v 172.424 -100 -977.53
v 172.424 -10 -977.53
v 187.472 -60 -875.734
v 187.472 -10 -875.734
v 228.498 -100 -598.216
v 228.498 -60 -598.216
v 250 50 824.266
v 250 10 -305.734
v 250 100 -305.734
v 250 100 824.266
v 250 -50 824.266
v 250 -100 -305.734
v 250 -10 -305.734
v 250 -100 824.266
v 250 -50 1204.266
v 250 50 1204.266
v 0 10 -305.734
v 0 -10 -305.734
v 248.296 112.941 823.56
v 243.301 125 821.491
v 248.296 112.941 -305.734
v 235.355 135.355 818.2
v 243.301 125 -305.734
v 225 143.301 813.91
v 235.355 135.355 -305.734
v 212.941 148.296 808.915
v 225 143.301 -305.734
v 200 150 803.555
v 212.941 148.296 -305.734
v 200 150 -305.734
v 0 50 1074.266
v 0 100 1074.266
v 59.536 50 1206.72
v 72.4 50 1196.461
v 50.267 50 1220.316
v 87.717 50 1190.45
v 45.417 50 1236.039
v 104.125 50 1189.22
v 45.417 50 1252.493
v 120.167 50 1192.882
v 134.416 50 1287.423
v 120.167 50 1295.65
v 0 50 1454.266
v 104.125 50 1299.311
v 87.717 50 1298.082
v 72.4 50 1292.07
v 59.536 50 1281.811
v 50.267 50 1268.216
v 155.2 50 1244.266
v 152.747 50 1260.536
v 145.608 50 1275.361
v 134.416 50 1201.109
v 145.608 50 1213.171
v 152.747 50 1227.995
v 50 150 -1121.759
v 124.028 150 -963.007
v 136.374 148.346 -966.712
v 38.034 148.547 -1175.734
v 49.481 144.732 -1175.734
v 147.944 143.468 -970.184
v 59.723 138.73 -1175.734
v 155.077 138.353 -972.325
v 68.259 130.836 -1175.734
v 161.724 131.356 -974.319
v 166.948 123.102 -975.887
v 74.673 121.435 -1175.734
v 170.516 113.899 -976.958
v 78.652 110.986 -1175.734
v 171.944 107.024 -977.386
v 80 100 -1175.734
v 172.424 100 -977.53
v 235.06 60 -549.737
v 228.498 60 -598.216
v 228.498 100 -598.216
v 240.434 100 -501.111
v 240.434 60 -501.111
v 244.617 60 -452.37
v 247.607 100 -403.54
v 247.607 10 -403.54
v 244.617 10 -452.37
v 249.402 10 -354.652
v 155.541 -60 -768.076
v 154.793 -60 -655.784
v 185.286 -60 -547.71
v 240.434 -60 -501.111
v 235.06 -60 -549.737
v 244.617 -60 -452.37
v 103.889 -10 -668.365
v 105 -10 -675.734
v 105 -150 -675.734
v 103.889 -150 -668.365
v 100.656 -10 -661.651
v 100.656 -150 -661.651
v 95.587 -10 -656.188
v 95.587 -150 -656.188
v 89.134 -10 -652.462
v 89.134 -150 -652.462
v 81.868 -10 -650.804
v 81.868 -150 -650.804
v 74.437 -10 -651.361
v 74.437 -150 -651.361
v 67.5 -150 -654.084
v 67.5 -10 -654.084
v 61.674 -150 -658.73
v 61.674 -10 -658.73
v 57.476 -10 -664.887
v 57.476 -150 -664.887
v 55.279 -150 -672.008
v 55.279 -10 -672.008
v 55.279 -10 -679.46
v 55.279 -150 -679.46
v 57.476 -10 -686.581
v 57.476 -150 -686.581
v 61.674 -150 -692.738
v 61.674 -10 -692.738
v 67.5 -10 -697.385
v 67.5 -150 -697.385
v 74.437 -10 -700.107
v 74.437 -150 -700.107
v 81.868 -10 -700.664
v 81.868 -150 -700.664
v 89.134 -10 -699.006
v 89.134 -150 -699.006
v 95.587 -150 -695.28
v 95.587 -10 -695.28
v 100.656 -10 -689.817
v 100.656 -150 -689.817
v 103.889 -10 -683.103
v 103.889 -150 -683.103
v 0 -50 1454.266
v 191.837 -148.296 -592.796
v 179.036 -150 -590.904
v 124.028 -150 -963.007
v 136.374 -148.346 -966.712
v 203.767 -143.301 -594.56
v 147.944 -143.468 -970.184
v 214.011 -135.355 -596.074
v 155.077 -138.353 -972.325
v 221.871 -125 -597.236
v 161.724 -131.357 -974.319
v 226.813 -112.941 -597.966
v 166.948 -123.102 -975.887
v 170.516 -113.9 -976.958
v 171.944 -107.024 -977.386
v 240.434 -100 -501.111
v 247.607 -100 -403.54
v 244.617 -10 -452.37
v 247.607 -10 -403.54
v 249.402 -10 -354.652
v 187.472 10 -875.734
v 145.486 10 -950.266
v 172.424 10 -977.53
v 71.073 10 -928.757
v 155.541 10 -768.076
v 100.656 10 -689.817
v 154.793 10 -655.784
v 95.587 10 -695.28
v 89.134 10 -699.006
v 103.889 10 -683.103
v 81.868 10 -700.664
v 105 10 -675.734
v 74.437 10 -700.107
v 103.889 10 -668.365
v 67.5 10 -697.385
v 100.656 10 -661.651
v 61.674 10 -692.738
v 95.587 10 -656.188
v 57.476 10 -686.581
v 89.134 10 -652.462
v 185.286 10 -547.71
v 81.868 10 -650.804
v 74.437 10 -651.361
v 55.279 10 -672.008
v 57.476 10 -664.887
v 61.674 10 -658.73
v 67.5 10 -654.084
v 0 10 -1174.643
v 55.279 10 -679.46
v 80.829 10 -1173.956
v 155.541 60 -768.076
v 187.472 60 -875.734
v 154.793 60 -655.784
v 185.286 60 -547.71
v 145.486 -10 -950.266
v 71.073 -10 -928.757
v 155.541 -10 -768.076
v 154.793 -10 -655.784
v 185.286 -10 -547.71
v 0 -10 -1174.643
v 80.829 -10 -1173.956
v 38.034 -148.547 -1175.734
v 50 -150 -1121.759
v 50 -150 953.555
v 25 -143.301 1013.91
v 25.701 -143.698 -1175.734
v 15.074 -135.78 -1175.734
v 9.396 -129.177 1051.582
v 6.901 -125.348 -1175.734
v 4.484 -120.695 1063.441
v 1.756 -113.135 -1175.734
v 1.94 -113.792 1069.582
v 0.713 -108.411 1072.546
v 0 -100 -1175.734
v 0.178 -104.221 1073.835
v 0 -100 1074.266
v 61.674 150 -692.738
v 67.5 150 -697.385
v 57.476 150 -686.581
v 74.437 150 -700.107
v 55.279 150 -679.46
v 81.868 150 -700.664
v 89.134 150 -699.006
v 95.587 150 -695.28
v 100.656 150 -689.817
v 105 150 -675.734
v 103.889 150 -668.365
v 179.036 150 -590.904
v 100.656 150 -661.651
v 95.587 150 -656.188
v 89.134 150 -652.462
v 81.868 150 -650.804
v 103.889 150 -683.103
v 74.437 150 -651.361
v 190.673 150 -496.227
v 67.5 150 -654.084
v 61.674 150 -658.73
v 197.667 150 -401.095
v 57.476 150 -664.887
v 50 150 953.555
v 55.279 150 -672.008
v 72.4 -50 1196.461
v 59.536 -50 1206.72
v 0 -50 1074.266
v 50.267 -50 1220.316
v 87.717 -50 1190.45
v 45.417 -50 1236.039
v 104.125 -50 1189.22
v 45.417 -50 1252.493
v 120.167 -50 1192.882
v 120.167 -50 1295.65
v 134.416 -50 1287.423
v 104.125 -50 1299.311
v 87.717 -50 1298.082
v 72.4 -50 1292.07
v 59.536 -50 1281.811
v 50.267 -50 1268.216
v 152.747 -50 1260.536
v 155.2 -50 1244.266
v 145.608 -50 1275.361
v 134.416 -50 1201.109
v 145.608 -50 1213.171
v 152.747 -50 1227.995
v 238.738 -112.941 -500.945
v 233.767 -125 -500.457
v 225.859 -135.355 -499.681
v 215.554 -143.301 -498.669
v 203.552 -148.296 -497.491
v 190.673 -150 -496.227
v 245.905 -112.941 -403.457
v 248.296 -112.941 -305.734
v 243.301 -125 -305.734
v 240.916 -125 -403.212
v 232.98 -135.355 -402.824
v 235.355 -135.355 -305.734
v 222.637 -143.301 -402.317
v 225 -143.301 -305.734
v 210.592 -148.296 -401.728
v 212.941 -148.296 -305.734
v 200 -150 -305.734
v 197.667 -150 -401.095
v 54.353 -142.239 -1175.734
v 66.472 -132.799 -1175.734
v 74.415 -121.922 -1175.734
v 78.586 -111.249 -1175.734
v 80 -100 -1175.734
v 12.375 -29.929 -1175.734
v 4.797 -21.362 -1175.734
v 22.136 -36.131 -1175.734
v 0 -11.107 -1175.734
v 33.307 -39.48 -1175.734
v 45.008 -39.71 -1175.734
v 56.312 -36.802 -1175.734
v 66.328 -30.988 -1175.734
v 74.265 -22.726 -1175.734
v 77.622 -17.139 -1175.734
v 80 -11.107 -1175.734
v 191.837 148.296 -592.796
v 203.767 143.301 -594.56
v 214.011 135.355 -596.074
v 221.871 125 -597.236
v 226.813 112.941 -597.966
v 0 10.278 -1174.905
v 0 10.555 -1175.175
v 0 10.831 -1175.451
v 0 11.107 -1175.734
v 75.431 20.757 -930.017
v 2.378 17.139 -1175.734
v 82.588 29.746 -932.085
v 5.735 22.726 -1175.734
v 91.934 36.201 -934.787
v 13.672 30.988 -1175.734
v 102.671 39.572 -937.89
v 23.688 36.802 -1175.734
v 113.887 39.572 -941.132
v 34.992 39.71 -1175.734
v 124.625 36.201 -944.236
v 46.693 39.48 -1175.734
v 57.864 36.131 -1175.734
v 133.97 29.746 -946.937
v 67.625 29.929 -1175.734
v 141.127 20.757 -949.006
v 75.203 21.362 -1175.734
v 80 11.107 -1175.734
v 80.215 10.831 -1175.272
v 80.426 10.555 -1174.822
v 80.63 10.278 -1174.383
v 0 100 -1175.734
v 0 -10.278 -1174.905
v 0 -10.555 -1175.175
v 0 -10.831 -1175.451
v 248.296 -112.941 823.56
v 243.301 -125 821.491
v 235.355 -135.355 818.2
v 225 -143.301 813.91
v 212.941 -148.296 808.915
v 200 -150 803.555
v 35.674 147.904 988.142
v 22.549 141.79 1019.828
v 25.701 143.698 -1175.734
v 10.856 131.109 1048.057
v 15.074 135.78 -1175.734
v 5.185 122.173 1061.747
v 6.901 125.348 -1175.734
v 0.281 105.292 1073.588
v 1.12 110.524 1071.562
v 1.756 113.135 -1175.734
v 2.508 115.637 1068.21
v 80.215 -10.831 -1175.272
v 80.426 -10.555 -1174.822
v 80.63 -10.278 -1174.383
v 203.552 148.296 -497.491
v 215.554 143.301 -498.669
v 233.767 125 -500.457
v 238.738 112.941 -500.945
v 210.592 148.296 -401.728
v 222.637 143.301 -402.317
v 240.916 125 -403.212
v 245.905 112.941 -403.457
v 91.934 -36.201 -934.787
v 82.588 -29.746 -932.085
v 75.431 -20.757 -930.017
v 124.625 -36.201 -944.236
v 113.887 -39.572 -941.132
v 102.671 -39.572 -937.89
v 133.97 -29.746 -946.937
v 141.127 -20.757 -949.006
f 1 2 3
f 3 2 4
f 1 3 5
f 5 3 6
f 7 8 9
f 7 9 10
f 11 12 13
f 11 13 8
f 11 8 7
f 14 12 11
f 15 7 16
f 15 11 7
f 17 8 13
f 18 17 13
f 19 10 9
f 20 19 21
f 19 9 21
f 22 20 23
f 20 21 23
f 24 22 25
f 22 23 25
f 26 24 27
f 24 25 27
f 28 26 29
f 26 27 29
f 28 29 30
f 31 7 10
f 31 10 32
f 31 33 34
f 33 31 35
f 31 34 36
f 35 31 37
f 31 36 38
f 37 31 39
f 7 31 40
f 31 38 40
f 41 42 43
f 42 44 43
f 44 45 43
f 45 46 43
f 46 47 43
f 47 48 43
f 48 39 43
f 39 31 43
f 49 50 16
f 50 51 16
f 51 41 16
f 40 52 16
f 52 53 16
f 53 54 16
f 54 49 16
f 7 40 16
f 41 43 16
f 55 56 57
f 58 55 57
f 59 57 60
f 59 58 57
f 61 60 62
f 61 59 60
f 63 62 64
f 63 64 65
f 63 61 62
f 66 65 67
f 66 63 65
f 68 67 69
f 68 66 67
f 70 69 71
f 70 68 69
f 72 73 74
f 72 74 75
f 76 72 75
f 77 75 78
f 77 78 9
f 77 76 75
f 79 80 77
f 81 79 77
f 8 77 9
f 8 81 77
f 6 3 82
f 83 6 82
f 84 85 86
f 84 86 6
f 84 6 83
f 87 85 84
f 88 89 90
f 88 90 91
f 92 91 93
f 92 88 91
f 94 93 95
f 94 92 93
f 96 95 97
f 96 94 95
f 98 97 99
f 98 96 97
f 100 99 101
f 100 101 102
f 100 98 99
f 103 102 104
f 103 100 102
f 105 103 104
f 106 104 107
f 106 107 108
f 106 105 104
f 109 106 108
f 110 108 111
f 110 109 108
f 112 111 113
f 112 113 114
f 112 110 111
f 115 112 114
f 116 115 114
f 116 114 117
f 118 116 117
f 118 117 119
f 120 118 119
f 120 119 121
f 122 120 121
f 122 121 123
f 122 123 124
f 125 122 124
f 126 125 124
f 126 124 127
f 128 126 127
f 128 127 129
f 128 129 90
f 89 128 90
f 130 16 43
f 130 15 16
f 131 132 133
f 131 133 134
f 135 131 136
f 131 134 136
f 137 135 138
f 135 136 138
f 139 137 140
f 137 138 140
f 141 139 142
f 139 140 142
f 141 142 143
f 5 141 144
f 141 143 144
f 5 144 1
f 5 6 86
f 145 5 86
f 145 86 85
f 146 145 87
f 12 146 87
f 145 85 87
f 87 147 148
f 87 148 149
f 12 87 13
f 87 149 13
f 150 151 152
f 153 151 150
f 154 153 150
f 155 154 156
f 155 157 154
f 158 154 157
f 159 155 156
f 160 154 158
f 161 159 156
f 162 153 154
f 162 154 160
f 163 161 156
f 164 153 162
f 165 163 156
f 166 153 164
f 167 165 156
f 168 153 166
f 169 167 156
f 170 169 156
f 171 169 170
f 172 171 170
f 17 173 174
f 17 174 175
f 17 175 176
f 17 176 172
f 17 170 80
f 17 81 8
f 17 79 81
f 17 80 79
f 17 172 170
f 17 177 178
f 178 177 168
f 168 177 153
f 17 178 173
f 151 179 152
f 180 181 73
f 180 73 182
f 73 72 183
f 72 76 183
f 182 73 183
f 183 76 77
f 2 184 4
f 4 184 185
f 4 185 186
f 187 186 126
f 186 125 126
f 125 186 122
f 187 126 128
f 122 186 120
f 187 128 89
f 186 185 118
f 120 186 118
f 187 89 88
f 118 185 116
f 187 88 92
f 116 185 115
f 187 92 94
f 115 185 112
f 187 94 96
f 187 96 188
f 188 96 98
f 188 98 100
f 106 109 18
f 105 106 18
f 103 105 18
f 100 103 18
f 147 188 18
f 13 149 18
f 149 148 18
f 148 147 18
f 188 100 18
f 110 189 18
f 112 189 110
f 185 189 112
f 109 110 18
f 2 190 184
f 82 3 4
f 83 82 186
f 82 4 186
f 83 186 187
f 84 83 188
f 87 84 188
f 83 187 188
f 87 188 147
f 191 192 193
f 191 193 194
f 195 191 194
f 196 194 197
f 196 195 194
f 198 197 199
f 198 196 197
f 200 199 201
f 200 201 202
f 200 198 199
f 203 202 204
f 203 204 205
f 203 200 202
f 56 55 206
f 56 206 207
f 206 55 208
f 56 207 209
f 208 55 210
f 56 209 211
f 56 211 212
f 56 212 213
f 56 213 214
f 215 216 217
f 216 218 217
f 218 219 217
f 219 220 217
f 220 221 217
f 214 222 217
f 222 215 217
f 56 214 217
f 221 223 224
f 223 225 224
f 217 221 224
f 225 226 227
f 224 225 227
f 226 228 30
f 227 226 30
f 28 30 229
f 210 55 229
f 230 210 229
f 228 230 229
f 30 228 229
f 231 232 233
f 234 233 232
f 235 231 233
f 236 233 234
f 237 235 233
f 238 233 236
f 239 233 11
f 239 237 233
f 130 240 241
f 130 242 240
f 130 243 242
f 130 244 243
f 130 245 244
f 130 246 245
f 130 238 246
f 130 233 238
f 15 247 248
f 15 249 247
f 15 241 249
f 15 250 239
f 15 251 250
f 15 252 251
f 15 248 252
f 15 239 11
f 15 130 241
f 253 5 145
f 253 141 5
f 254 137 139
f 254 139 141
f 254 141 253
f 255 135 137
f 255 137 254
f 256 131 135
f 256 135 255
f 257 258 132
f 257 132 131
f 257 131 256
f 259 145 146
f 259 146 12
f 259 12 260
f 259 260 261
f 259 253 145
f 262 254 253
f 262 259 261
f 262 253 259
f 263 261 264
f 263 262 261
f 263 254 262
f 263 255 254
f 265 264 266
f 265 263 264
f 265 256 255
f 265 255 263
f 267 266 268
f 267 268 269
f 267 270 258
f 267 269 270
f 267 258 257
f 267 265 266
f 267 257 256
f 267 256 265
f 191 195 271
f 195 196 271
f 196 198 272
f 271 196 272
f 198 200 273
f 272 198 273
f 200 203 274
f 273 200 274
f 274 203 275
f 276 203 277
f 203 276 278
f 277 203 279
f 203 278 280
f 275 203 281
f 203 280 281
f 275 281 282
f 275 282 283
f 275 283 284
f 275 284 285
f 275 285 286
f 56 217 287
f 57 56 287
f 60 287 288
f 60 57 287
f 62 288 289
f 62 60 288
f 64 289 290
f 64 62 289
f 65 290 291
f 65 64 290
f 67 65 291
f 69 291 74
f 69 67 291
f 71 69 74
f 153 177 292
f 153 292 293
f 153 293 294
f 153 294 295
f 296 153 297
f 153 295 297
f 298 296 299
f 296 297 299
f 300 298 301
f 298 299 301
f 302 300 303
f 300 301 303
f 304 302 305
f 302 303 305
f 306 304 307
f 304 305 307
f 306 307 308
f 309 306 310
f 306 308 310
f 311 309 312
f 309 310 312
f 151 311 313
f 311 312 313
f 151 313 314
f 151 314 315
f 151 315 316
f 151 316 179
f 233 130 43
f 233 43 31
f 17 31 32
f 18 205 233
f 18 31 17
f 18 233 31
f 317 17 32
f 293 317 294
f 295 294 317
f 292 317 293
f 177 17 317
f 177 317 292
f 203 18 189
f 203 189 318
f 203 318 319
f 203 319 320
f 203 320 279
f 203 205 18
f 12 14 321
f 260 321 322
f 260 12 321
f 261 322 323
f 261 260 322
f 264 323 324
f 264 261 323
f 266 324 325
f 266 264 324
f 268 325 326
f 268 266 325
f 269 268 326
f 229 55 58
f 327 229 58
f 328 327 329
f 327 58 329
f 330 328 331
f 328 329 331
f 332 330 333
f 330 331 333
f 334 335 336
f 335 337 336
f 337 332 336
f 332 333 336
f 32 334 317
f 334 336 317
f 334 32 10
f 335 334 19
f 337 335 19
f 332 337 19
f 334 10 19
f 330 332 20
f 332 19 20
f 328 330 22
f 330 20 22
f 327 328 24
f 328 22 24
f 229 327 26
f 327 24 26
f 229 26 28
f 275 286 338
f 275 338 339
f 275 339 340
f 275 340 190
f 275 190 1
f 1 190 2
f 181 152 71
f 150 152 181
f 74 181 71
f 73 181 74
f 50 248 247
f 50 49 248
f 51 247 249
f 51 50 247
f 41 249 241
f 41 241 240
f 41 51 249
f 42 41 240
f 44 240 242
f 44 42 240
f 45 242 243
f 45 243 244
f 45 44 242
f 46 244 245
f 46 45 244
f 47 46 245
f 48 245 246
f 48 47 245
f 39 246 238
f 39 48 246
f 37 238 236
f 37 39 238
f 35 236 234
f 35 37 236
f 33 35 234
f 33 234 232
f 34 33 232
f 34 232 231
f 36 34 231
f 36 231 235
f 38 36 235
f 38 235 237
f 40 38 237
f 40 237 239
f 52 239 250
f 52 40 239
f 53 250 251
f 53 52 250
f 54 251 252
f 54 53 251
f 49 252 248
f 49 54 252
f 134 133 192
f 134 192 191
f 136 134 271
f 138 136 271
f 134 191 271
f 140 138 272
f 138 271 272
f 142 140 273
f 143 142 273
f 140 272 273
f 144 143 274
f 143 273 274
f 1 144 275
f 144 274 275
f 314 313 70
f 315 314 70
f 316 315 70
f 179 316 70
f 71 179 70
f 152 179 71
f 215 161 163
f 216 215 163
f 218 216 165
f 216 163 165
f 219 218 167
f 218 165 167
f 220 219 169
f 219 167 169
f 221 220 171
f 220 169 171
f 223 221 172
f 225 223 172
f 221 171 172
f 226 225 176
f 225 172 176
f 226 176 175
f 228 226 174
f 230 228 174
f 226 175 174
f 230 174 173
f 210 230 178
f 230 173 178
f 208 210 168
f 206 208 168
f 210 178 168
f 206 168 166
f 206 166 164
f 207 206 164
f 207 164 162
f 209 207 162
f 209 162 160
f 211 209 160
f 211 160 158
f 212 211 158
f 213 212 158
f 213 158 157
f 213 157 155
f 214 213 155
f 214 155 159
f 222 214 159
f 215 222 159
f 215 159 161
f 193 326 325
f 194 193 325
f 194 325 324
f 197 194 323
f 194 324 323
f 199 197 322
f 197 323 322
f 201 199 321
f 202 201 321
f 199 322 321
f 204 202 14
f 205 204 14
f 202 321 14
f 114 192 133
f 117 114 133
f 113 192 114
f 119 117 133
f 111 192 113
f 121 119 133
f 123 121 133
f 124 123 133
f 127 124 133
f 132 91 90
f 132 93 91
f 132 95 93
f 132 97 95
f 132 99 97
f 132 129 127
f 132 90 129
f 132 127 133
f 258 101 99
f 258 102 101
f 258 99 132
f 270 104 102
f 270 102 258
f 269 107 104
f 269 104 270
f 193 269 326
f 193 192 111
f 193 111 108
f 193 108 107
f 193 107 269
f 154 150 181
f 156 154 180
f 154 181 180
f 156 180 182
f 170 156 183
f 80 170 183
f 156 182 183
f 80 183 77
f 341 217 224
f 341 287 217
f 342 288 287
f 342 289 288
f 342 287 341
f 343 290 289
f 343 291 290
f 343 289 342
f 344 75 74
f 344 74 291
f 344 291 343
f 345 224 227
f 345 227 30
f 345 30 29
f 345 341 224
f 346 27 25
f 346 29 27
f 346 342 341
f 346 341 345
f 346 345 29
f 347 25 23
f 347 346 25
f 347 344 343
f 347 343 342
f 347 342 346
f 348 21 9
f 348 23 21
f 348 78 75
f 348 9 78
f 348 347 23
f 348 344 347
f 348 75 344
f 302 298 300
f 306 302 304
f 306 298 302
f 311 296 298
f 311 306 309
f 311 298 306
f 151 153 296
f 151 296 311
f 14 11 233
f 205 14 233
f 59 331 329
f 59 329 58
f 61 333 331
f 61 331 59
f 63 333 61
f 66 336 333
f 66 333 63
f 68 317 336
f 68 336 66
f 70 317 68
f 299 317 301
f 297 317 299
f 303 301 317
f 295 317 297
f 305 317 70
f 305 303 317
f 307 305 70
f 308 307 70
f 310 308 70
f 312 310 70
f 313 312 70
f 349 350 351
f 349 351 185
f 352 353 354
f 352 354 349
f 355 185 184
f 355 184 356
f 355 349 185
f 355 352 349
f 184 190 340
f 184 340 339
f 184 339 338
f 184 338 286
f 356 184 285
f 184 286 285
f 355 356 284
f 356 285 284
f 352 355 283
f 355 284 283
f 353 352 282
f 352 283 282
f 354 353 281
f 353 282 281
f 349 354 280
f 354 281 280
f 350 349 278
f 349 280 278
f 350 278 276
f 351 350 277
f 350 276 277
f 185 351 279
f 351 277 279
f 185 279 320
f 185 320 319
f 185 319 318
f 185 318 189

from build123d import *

# Parameters (mm, degrees)
F0_R          = 25
F1_DEPTH      = 150
F0_R_2        = 55.1997583715
F2_DEPTH      = 50
F4_DEPTH      = 250.001
F8_DEPTH      = 60
F10_R         = 40
F11_DEPTH     = 257
F12_T1_DEPTH  = 1255
F12_T3_DEPTH  = 2500
F12_T5_DEPTH  = 603.5533905933
F12_T7_DEPTH  = 556.1937137964
F12_T9_DEPTH  = 595.9370668734
F12_T14_DEPTH = 330
F12_S15_R     = 50
F12_T16_DEPTH = 170
F12_T20_DEPTH = 330
F12_S21_R     = 50
F12_T22_DEPTH = 170
F12_T26_DEPTH = 330
F12_S27_R     = 50
F12_T28_DEPTH = 170
F12_T32_DEPTH = 330
F12_S33_R     = 50
F12_T34_DEPTH = 170
F12_T36_ANGLE = 8.4091330213
F12_T38_ANGLE = 8.4091330213


# Not quite as in the source:
# - a fillet or chamfer that OpenCascade refuses, or shapes differently, is made with other operations: its cross-section is extruded or revolved along the edge and cut away or added


with BuildPart() as f1:
    # F0 (on Front) → F1 (new body)
    with BuildSketch(Plane.XZ):
        with BuildLine():
            Line((250, 824.2658257814), (0, 1074.2658257814))
            Line((0, 1074.2658257814), (0, -1175.7341742186))
            Line((0, -1175.7341742186), (80, -1175.7341742186))
            Line((80, -1175.7341742186), (172.4239571783, -977.530358429))
            Line((172.4239571783, -977.530358429), (228.4980691431, -598.2156102055))
            ThreePointArc((228.4980691431, -598.2156102055), (244.6172738506, -452.3695412242), (250, -305.7341742186))
            Line((250, -305.7341742186), (250, 824.2658257814))
        make_face()
        with Locations((80, -675.7341742186)):
            Circle(F0_R, mode=Mode.SUBTRACT)
    extrude(amount=F1_DEPTH)

    # F0 (on Front) → F2 (join)
    with BuildSketch(Plane.XZ):
        Polygon((0, 1454.2658257814), (0, 1074.2658257814), (250, 824.2658257814), (250, 1204.2658257814), align=None)
        with Locations((100, 1244.2658257814)):
            Circle(F0_R_2, mode=Mode.SUBTRACT)
    extrude(amount=F2_DEPTH)

    # F3 (on face) → F4 (cut, through all)
    with BuildSketch(Plane(origin=(0, 0, 0), x_dir=(0, -1, 0), z_dir=(-1, 0, 0))):
        Polygon((10, -1175.7341742186), (10, -305.7341742186), (0, -305.7341742186), (0, -598.2156102055), (0, -977.530358429), (0, -1175.7341742186), align=None)
    extrude(amount=-F4_DEPTH, mode=Mode.SUBTRACT)

    # F5: F1 across plane


with BuildPart() as f1_1:
    add(f1.part)
    add(f1.part.mirror(Plane.XZ))

    # F7 (on offset) → F8 (cut, symmetric)
    with BuildSketch(Plane(origin=(0, 0, 0), x_dir=(-1, 0, 0), z_dir=(0, 1, 0))):
        with BuildLine():
            Line((-228.4980691431, -598.2156102055), (-187.4724905077, -875.7341742186))
            ThreePointArc((-187.4724905077, -875.7341742186), (-154.7929091893, -655.7842074431), (-244.6172738506, -452.3695412242))
            Line((-244.6172738506, -452.3695412242), (-228.4980691431, -598.2156102055))
        make_face()
        Polygon((-289.7645564147, -893.9040561501), (-187.4724905077, -875.7341742186), (-228.4980691431, -598.2156102055), (-244.6172738506, -452.3695412242), (-337.4301303856, -462.6274072361), align=None)
    extrude(amount=F8_DEPTH, both=True, mode=Mode.SUBTRACT)

    # F10 (on face) → F11 (cut)
    with BuildSketch(Plane(origin=(-313.6375788675, 0, -1085.0784920755), x_dir=(0.9606739331, 0, -0.2776789409), z_dir=(-0.2776789409, 0, -0.9606739331))):
        with Locations((364.9035775946, 0)):
            Circle(F10_R)
    extrude(amount=-F11_DEPTH, mode=Mode.SUBTRACT)

    # F12: fillet of radius 50 on 14 edges, made by hand

    # F12_s2 → F12_t1 (cut)
    with BuildSketch(Plane.XY.offset(-305.7341742186)):
        with BuildLine():
            ThreePointArc((250, -100), (235.3553390593, -135.3553390593), (200, -150))
            Line((200, -150), (250, -150))
            Line((250, -150), (250, -100))
        make_face()
        with BuildLine():
            ThreePointArc((250, 100), (235.3553390593, 135.3553390593), (200, 150))
            Line((200, 150), (250, 150))
            Line((250, 150), (250, 100))
        make_face()
    extrude(amount=F12_T1_DEPTH, mode=Mode.SUBTRACT)

    # F12_s4 → F12_t3 (cut)
    with BuildSketch(Plane.XY.offset(-1300.7341742186)):
        with BuildLine():
            ThreePointArc((50, -150), (14.6446609407, -135.3553390593), (0, -100))
            Line((0, -100), (0, -150))
            Line((0, -150), (50, -150))
        make_face()
        with BuildLine():
            ThreePointArc((50, 150), (14.6446609407, 135.3553390593), (0, 100))
            Line((0, 100), (0, 150))
            Line((0, 150), (50, 150))
        make_face()
    extrude(amount=F12_T3_DEPTH, mode=Mode.SUBTRACT)

    # F12_s6 → F12_t5 (cut)
    with BuildSketch(Plane(origin=(-198.7445652424, 0, 198.7445652424), x_dir=(0, 1, 0), z_dir=(-0.7071067812, 0, 0.7071067812))):
        with BuildLine():
            ThreePointArc((-150, -709.620650207), (-135.3553390593, -744.9759892663), (-100, -759.620650207))
            Line((-100, -759.620650207), (-150, -759.620650207))
            Line((-150, -759.620650207), (-150, -709.620650207))
        make_face()
        with BuildLine():
            ThreePointArc((100, -759.620650207), (135.3553390593, -744.9759892663), (150, -709.620650207))
            Line((150, -709.620650207), (150, -759.620650207))
            Line((150, -759.620650207), (100, -759.620650207))
        make_face()
    extrude(amount=F12_T5_DEPTH, mode=Mode.SUBTRACT)

    # F12_s8 → F12_t7 (cut)
    with BuildSketch(Plane(origin=(-488.8711024777, 0, -1048.3874625005), x_dir=(0, 1, 0), z_dir=(0.4226182617, 0, 0.906307787))):
        with BuildLine():
            ThreePointArc((-150, -519.3913559403), (-135.3553390593, -554.7466949997), (-100, -569.3913559403))
            Line((-100, -569.3913559403), (-150, -569.3913559403))
            Line((-150, -569.3913559403), (-150, -519.3913559403))
        make_face()
        with BuildLine():
            ThreePointArc((150, -519.3913559403), (135.3553390593, -554.7466949997), (100, -569.3913559403))
            Line((100, -569.3913559403), (150, -569.3913559403))
            Line((150, -569.3913559403), (150, -519.3913559403))
        make_face()
    extrude(amount=F12_T7_DEPTH, mode=Mode.SUBTRACT)

    # F12_s10 → F12_t9 (cut)
    with BuildSketch(Plane(origin=(-168.8064738845, 0, -1141.8956608733), x_dir=(0, 1, 0), z_dir=(0.146240718, 0, 0.9892490346))):
        with BuildLine():
            ThreePointArc((-150, -263.5249746526), (-135.3553390593, -298.8803137119), (-100, -313.5249746526))
            Line((-100, -313.5249746526), (-150, -313.5249746526))
            Line((-150, -313.5249746526), (-150, -263.5249746526))
        make_face()
        with BuildLine():
            ThreePointArc((150, -263.5249746526), (135.3553390593, -298.8803137119), (100, -313.5249746526))
            Line((100, -313.5249746526), (150, -313.5249746526))
            Line((150, -313.5249746526), (150, -263.5249746526))
        make_face()
    extrude(amount=F12_T9_DEPTH, mode=Mode.SUBTRACT)


with BuildPart() as f12_tool12:
    # F12_s13 → F12_t14 (new body)
    with BuildSketch(Plane.YZ.offset(-125)):
        with BuildLine():
            ThreePointArc((-150, -1125.7341742186), (-135.3553390593, -1161.0895132779), (-100, -1175.7341742186))
            Line((-100, -1175.7341742186), (-150, -1175.7341742186))
            Line((-150, -1175.7341742186), (-150, -1125.7341742186))
        make_face()
    extrude(amount=F12_T14_DEPTH)

    # F12_s15 → F12_t16 (cut, symmetric)
    with BuildSketch(Plane(origin=(-433.606336546, 0, -929.8717894996), x_dir=(0, 1, 0), z_dir=(-0.4226182617, 0, -0.906307787))):
        with Locations((-100, 519.3913559403)):
            Circle(F12_S15_R)
    extrude(amount=F12_T16_DEPTH, both=True, mode=Mode.SUBTRACT)


with BuildPart() as f1_2:
    add(f1_1.part)

    # F12_t11: cut F12_tool12
    add(f12_tool12.part, mode=Mode.SUBTRACT)


with BuildPart() as f12_tool18:
    # F12_s19 → F12_t20 (new body)
    with BuildSketch(Plane.YZ.offset(-125)):
        with BuildLine():
            ThreePointArc((-150, -1125.7341742186), (-135.3553390593, -1161.0895132779), (-100, -1175.7341742186))
            Line((-100, -1175.7341742186), (-150, -1175.7341742186))
            Line((-150, -1175.7341742186), (-150, -1125.7341742186))
        make_face()
    extrude(amount=F12_T20_DEPTH)

    # F12_s21 → F12_t22 (cut, symmetric)
    with BuildSketch(Plane.XY.offset(-1150.7)):
        with Locations((50, -100)):
            Circle(F12_S21_R)
    extrude(amount=F12_T22_DEPTH, both=True, mode=Mode.SUBTRACT)


with BuildPart() as f1_3:
    add(f1_2.part)

    # F12_t17: cut F12_tool18
    add(f12_tool18.part, mode=Mode.SUBTRACT)


with BuildPart() as f12_tool24:
    # F12_s25 → F12_t26 (new body)
    with BuildSketch(Plane.YZ.offset(-125)):
        with BuildLine():
            ThreePointArc((150, -1125.7341742186), (135.3553390593, -1161.0895132779), (100, -1175.7341742186))
            Line((100, -1175.7341742186), (150, -1175.7341742186))
            Line((150, -1175.7341742186), (150, -1125.7341742186))
        make_face()
    extrude(amount=F12_T26_DEPTH)

    # F12_s27 → F12_t28 (cut, symmetric)
    with BuildSketch(Plane(origin=(-433.606336546, 0, -929.8717894996), x_dir=(0, 1, 0), z_dir=(-0.4226182617, 0, -0.906307787))):
        with Locations((100, 519.3913559403)):
            Circle(F12_S27_R)
    extrude(amount=F12_T28_DEPTH, both=True, mode=Mode.SUBTRACT)


with BuildPart() as f1_4:
    add(f1_3.part)

    # F12_t23: cut F12_tool24
    add(f12_tool24.part, mode=Mode.SUBTRACT)


with BuildPart() as f12_tool30:
    # F12_s31 → F12_t32 (new body)
    with BuildSketch(Plane.YZ.offset(-125)):
        with BuildLine():
            ThreePointArc((150, -1125.7341742186), (135.3553390593, -1161.0895132779), (100, -1175.7341742186))
            Line((100, -1175.7341742186), (150, -1175.7341742186))
            Line((150, -1175.7341742186), (150, -1125.7341742186))
        make_face()
    extrude(amount=F12_T32_DEPTH)

    # F12_s33 → F12_t34 (cut, symmetric)
    with BuildSketch(Plane.XY.offset(-1150.7)):
        with Locations((50, 100)):
            Circle(F12_S33_R)
    extrude(amount=F12_T34_DEPTH, both=True, mode=Mode.SUBTRACT)


with BuildPart() as f1_5:
    add(f1_4.part)

    # F12_t29: cut F12_tool30
    add(f12_tool30.part, mode=Mode.SUBTRACT)

    # F12_s35 → F12_t36 (revolve, cut)
    with BuildSketch(Plane(origin=(-81.6562093461, 0, -552.3654928034), x_dir=(0, 1, 0), z_dir=(-0.146240718, 0, -0.9892490346))):
        with BuildLine():
            ThreePointArc((-100, 313.5249746526), (-135.3553390593, 298.8803137119), (-150, 263.5249746526))
            Line((-150, 263.5249746526), (-150, 313.5249746526))
            Line((-150, 313.5249746526), (-100, 313.5249746526))
        make_face()
    revolve(axis=Axis((-1749.9999999999, -150, -305.7341742186), (0, -1, 0)), revolution_arc=F12_T36_ANGLE, mode=Mode.SUBTRACT)

    # F12_s37 → F12_t38 (revolve, cut)
    with BuildSketch(Plane(origin=(-81.6562093461, 0, -552.3654928034), x_dir=(0, 1, 0), z_dir=(-0.146240718, 0, -0.9892490346))):
        with BuildLine():
            ThreePointArc((150, 263.5249746526), (135.3553390593, 298.8803137119), (100, 313.5249746526))
            Line((100, 313.5249746526), (150, 313.5249746526))
            Line((150, 313.5249746526), (150, 263.5249746526))
        make_face()
    revolve(axis=Axis((-1749.9999999999, 150, -305.7341742186), (0, -1, 0)), revolution_arc=F12_T38_ANGLE, mode=Mode.SUBTRACT)


solid = f1_5.part
